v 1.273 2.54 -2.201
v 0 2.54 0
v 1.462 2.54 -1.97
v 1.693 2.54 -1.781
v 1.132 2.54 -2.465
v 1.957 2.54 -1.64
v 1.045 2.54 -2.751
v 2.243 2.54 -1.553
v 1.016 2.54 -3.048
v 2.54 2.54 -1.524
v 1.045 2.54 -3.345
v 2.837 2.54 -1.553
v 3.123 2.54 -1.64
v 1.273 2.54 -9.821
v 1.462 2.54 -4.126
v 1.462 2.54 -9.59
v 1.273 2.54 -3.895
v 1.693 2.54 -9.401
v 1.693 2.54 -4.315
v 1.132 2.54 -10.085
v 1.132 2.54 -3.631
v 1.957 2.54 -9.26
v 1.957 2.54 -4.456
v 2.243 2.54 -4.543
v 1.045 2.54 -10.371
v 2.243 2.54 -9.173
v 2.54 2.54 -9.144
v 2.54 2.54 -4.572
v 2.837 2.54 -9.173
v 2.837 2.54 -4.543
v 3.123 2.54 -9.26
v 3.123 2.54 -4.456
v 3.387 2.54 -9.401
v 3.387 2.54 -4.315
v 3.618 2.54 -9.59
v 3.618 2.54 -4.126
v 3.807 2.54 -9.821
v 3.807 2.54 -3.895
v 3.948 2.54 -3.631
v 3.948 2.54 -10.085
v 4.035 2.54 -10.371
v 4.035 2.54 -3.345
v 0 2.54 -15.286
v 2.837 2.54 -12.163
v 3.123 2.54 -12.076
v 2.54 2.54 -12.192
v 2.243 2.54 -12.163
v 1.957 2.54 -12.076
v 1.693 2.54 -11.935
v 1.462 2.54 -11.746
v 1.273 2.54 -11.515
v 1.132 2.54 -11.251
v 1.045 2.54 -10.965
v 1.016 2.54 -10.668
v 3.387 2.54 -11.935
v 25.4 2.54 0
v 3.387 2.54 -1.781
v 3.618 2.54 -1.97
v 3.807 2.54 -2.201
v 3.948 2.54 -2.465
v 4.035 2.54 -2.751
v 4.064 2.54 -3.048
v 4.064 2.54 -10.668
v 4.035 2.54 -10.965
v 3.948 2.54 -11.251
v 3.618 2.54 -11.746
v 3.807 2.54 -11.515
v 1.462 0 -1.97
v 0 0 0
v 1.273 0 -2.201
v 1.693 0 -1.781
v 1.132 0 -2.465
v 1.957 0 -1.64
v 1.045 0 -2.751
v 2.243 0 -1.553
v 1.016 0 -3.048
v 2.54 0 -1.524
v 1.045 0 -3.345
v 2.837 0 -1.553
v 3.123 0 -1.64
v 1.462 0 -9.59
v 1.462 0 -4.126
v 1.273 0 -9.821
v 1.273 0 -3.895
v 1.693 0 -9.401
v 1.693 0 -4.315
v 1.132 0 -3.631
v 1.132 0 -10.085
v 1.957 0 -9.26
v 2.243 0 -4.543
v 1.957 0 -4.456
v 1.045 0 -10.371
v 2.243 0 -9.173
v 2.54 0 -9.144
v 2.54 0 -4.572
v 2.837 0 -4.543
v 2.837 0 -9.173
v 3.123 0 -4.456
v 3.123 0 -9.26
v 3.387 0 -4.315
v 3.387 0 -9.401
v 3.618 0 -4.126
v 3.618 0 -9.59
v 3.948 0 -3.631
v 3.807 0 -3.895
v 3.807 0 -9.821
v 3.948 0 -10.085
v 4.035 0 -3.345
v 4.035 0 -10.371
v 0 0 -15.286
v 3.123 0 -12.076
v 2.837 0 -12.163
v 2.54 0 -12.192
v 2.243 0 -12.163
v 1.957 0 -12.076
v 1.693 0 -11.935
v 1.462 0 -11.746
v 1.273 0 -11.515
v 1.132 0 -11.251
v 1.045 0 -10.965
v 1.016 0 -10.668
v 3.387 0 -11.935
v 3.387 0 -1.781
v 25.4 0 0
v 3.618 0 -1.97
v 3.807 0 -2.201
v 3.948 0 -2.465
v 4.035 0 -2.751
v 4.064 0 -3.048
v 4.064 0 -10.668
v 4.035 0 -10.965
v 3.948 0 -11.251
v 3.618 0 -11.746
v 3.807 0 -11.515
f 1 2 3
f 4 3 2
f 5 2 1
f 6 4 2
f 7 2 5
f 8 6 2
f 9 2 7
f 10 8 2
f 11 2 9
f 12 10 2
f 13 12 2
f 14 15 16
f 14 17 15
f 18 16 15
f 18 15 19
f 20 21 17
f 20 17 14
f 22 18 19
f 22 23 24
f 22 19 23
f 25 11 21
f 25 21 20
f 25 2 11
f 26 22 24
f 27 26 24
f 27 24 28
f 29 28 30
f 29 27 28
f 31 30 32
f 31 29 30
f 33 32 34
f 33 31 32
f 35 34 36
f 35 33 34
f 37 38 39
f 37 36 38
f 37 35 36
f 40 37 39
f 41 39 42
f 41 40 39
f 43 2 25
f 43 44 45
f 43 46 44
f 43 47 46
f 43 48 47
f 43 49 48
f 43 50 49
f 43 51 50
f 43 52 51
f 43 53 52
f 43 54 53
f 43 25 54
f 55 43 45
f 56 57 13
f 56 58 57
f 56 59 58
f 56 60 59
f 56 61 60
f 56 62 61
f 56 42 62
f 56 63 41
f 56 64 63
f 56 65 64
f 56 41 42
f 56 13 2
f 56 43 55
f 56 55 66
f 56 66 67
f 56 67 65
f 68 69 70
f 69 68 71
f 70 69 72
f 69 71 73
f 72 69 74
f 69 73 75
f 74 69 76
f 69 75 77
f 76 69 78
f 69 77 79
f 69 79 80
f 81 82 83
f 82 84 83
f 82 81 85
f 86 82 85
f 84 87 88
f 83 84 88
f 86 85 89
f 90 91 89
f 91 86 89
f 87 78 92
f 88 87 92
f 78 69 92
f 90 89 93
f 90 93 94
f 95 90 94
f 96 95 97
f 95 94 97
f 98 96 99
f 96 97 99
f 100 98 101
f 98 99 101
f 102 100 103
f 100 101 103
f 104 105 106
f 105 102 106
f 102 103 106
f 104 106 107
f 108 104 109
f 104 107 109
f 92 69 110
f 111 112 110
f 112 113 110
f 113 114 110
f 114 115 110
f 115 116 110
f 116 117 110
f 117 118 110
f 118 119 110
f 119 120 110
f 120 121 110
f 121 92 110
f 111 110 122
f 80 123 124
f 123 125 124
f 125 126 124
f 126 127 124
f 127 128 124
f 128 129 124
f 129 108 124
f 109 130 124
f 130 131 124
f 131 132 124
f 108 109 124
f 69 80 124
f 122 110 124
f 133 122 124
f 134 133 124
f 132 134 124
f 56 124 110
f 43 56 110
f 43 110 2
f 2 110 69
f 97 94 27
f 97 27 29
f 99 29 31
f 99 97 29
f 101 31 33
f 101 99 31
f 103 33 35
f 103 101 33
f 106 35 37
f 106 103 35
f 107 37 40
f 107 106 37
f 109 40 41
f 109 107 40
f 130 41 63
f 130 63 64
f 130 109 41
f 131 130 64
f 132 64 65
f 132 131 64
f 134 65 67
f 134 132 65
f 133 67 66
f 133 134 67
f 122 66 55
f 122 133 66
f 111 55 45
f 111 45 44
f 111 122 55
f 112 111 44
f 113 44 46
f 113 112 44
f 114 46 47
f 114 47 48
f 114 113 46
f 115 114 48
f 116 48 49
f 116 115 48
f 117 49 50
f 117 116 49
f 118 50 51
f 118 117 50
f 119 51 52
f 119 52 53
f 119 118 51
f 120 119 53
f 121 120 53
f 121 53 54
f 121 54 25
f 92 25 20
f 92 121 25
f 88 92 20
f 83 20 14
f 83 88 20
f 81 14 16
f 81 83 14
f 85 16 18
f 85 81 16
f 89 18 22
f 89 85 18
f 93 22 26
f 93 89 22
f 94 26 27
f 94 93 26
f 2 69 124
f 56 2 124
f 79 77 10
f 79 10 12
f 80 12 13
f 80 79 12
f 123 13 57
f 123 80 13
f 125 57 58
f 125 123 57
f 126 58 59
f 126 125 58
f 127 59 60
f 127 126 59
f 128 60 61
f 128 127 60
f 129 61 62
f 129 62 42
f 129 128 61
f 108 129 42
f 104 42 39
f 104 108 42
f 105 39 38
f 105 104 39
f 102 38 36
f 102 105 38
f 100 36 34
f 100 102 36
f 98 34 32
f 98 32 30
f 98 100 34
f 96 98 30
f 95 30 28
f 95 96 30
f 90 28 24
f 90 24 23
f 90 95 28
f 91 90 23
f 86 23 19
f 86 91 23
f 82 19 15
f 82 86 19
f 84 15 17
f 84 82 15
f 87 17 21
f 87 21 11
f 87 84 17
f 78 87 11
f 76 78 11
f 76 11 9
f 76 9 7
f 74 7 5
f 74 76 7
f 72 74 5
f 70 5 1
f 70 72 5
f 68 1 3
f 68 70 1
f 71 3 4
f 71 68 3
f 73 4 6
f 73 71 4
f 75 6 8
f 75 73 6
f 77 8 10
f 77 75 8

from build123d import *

# Parameters (mm, degrees)
SKETCH1_R           = 1.524
BOSS_EXTRUDE1_DEPTH = 2.54


with BuildPart() as part:
    # Sketch1 → Boss-Extrude1 (new body)
    with BuildSketch(Plane(origin=(0, 0, 0), x_dir=(1, 0, 0), z_dir=(0, 1, 0))):
        Polygon((0, 0), (25.4, 0), (0, 15.285917978), align=None)
        with Locations(Location((2.54, 3.048, 0), (0, 0, 270))):
            Circle(SKETCH1_R, mode=Mode.SUBTRACT)
        with Locations(Location((2.54, 10.668, 0), (0, 0, 270))):
            Circle(SKETCH1_R, mode=Mode.SUBTRACT)
    extrude(amount=BOSS_EXTRUDE1_DEPTH)


solid = part.part
